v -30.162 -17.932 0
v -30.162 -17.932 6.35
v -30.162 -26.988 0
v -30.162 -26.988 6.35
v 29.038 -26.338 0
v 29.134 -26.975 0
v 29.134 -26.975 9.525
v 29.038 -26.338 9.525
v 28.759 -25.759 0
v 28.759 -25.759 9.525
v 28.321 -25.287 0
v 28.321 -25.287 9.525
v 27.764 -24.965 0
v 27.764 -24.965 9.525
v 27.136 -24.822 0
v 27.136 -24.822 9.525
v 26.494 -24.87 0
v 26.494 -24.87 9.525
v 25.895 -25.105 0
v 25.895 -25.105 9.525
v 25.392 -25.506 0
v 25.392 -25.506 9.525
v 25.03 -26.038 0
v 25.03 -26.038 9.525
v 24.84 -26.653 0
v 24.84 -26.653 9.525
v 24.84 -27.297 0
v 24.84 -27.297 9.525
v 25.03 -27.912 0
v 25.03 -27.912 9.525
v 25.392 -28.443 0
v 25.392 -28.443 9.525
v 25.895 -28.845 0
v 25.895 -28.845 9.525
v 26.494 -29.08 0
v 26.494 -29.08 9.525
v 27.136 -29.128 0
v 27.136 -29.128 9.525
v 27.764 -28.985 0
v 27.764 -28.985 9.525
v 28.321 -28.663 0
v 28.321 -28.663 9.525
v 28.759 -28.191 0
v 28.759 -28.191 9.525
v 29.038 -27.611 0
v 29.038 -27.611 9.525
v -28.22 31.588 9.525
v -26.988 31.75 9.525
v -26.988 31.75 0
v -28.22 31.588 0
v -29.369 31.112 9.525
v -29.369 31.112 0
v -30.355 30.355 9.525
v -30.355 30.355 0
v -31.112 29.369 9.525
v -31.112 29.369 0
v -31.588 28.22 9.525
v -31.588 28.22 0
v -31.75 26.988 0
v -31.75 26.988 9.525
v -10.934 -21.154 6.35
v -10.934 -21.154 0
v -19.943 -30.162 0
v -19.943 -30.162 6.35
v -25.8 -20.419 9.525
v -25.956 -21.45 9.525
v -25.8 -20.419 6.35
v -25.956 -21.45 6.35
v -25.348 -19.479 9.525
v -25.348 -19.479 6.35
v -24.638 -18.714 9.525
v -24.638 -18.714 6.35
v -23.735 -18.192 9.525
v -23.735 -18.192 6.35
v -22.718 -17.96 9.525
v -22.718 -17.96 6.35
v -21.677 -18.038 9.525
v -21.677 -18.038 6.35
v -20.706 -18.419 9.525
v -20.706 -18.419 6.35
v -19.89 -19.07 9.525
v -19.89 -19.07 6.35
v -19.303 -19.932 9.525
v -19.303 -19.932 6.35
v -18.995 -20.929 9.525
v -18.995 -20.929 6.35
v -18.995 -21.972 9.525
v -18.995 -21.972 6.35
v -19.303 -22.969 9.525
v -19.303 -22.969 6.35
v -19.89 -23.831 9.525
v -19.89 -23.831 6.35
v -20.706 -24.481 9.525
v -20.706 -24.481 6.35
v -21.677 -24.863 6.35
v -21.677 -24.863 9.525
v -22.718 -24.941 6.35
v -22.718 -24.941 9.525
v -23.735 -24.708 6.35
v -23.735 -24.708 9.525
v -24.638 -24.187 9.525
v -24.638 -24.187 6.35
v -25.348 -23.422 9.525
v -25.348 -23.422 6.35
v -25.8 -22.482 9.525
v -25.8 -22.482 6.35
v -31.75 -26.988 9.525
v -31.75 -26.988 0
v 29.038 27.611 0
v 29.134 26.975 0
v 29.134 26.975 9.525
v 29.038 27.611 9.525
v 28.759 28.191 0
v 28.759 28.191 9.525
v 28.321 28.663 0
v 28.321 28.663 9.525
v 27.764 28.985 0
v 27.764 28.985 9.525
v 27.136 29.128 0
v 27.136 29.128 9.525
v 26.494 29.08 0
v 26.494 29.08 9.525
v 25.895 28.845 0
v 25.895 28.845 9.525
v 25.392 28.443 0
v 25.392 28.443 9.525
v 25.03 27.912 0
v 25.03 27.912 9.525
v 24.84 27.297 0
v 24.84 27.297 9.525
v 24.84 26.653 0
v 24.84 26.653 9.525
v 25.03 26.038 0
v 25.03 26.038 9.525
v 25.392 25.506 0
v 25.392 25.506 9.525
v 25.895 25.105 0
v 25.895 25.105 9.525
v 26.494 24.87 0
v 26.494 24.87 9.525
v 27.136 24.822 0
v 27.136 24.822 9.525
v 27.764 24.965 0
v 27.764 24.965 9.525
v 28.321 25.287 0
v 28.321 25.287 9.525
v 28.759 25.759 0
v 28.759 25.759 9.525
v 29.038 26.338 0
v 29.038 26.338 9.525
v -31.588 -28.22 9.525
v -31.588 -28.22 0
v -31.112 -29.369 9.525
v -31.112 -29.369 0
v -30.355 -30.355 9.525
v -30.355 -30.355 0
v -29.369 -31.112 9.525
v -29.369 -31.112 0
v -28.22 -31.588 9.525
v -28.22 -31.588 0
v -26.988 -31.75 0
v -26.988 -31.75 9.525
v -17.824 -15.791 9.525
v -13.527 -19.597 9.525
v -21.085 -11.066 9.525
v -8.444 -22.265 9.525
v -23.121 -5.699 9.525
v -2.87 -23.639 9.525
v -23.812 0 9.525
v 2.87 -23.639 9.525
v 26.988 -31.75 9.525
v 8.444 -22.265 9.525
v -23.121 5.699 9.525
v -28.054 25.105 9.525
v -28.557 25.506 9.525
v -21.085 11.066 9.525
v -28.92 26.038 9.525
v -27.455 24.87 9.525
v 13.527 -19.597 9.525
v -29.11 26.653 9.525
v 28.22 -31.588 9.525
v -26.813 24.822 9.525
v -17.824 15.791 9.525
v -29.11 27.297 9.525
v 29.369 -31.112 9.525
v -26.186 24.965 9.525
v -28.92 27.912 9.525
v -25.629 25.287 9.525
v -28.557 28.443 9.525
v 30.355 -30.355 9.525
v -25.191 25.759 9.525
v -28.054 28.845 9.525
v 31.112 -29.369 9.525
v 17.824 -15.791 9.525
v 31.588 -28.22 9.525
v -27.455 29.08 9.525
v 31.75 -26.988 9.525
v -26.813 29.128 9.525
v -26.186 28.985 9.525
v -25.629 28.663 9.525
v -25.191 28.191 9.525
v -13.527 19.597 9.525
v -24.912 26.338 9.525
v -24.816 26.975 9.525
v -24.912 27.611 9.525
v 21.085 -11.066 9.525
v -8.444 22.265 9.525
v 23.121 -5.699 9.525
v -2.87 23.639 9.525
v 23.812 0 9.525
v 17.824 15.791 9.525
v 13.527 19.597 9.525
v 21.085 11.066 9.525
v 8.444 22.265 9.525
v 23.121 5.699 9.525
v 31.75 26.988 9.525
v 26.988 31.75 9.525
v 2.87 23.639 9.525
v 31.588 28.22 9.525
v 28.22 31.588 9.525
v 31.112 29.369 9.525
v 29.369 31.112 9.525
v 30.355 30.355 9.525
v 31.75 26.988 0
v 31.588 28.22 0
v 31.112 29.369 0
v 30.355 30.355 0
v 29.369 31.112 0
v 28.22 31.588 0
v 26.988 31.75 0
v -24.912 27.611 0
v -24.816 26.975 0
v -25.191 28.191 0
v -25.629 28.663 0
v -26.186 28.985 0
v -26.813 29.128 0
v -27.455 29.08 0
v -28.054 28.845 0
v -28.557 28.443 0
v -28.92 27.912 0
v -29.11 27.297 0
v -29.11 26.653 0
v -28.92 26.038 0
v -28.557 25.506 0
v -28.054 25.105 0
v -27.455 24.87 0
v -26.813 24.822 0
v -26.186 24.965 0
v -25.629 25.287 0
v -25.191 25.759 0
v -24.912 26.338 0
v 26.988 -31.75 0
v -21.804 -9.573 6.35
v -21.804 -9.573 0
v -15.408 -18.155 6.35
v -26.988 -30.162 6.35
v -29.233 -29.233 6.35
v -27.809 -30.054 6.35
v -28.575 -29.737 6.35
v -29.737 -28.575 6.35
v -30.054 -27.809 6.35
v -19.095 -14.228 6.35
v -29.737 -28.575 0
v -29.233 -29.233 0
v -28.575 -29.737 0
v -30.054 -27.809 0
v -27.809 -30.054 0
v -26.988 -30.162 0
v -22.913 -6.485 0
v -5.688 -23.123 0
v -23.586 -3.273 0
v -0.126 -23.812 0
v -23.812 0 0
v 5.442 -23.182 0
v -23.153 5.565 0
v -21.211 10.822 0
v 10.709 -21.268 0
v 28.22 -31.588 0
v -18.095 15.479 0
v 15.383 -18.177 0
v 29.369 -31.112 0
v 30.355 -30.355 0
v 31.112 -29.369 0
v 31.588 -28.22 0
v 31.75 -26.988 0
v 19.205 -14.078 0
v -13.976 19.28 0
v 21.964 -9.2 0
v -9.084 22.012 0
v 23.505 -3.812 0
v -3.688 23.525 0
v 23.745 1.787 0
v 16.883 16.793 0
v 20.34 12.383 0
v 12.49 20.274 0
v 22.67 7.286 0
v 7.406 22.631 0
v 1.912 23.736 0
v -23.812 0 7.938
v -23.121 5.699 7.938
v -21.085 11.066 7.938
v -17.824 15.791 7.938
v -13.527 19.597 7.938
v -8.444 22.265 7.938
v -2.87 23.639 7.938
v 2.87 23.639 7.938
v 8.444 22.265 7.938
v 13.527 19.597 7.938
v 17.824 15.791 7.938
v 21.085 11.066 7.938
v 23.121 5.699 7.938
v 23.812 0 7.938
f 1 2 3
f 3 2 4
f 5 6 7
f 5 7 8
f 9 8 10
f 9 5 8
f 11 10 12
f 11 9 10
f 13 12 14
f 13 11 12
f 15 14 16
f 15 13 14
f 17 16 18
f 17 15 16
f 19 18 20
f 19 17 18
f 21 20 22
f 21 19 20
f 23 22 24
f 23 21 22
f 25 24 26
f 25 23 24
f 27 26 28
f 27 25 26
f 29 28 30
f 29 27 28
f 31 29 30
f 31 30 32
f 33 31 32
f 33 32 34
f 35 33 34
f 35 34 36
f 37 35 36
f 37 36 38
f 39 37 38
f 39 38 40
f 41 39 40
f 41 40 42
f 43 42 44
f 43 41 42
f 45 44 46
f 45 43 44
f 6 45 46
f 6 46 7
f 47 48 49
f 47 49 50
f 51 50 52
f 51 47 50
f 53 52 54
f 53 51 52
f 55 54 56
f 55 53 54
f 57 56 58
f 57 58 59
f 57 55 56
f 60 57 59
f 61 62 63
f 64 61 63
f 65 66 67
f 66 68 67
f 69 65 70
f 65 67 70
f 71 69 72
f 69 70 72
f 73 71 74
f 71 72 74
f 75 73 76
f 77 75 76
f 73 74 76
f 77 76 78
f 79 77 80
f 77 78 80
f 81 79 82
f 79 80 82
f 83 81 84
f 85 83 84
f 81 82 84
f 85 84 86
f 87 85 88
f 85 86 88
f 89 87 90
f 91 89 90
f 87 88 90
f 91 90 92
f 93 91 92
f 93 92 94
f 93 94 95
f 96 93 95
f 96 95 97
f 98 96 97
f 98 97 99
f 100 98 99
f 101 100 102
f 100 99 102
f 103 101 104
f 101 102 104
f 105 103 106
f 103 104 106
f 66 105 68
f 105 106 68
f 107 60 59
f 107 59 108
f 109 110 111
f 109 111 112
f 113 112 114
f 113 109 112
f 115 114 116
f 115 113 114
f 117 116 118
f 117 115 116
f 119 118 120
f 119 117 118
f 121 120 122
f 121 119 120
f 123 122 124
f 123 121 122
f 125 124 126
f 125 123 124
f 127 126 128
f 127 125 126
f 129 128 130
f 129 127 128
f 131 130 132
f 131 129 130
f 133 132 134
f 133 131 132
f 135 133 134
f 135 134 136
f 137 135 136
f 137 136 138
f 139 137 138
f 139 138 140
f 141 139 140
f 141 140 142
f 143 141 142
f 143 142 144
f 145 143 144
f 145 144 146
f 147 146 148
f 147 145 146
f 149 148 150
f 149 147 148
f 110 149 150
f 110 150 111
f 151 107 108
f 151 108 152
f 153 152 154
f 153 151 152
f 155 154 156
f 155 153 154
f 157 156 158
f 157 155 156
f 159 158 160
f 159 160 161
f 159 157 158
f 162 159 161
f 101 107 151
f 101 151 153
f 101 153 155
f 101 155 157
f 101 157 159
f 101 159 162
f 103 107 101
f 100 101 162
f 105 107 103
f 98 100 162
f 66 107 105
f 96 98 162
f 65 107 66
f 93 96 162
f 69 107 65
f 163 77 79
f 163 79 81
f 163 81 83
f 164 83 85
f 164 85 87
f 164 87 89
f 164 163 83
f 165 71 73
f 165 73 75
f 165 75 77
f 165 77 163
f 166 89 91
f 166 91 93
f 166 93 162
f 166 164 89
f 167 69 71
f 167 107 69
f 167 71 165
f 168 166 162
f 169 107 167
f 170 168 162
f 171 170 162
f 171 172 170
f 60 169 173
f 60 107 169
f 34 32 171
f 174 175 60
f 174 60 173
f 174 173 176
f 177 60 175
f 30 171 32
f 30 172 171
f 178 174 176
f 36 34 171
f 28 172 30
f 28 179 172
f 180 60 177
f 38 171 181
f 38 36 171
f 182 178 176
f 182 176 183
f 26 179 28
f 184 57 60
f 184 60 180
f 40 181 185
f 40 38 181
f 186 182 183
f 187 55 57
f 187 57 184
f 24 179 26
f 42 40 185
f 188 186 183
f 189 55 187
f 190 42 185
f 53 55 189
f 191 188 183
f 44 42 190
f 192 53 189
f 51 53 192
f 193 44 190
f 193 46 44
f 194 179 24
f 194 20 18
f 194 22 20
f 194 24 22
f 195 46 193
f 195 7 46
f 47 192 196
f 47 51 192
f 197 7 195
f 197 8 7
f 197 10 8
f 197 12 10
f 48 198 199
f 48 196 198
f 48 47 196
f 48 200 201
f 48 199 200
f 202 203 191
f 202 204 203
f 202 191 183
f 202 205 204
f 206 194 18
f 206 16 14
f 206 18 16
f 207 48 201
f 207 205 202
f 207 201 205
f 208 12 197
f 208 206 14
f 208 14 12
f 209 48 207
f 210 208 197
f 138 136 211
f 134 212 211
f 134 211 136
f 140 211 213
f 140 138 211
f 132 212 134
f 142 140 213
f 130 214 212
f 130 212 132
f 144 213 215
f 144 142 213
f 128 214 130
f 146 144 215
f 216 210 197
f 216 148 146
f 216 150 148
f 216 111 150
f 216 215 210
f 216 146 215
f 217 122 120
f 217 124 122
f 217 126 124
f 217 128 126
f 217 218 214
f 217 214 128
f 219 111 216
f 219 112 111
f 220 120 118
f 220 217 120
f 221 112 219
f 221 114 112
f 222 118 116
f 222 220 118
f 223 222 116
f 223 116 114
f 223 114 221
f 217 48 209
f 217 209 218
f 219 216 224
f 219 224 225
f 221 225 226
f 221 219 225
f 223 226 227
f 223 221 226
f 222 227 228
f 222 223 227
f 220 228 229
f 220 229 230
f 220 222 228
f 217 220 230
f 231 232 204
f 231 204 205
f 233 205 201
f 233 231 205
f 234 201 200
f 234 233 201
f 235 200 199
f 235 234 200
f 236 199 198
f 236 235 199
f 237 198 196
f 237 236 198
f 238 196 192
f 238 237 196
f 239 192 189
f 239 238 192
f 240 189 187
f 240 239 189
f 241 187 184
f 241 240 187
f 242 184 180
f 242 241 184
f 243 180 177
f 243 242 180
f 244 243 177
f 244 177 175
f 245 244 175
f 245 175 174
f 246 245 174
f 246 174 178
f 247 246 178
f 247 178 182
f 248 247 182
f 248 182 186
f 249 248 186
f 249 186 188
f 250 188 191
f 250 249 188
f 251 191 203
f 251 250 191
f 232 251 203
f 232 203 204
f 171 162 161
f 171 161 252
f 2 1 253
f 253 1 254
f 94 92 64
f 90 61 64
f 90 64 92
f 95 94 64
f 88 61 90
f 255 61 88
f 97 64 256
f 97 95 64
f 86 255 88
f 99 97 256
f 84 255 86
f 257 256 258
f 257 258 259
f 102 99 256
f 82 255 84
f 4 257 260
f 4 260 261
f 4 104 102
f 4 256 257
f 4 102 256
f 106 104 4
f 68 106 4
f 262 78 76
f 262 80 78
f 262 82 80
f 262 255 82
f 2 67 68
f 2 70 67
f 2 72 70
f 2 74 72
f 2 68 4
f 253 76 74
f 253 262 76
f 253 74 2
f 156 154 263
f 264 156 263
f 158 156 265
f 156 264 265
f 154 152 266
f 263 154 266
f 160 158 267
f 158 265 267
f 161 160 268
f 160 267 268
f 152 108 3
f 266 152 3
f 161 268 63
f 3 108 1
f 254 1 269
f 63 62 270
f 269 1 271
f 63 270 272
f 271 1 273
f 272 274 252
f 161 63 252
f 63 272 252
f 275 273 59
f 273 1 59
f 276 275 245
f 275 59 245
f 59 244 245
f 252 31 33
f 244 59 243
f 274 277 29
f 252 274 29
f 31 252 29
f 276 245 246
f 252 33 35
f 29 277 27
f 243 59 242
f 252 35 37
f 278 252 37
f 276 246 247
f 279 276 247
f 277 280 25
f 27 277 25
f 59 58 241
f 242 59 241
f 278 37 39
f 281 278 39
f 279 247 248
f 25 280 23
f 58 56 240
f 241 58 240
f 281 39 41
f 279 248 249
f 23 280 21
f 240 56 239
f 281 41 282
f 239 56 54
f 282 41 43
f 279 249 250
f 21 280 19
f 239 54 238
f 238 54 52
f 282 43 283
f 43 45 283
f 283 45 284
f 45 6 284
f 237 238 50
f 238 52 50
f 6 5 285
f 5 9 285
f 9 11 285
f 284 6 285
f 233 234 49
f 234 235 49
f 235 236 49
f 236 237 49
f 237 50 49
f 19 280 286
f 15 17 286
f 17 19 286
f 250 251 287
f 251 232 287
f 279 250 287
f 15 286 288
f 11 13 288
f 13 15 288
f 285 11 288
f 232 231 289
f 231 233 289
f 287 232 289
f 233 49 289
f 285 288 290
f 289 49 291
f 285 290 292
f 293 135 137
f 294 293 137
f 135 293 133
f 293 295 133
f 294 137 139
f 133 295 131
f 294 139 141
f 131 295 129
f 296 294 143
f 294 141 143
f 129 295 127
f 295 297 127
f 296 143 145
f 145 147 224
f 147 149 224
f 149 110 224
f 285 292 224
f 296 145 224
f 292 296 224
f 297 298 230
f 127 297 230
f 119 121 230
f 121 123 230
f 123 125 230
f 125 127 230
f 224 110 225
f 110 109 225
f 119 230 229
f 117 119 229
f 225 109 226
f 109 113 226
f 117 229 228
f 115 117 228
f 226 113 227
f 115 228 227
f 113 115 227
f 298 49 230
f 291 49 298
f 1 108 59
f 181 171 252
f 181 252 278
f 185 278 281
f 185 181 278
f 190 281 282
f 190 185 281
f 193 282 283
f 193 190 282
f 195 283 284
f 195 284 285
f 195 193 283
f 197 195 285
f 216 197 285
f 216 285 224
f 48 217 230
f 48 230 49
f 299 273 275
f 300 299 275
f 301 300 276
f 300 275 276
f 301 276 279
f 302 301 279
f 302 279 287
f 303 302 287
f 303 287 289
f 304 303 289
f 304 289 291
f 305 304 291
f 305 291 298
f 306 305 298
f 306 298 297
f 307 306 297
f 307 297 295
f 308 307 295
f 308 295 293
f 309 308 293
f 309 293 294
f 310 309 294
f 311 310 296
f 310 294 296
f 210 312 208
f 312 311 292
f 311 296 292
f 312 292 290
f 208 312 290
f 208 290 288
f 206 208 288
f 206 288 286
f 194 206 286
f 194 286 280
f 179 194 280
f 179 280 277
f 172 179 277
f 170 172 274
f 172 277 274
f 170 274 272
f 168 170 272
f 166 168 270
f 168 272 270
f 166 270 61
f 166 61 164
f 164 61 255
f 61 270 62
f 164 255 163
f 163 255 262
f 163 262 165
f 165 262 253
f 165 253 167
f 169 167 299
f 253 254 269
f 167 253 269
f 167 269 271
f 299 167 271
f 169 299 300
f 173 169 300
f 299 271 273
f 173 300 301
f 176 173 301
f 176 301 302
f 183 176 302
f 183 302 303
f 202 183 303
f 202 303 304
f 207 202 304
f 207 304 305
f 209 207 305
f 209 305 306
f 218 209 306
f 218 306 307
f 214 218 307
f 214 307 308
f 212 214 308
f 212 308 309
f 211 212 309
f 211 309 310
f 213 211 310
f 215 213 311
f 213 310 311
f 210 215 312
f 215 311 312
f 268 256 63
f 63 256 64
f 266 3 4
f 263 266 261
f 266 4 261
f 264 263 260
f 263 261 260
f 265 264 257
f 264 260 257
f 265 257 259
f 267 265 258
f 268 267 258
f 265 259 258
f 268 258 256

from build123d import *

# Parameters (mm, degrees)
SKETCH1_R                = 2.159
SKETCH1_R_2              = 28.5115
BOSS_EXTRUDE1_DEPTH      = 9.525
SKETCH1_4_R              = 28.5115
SKETCH1_4_R_2            = 23.8125
FLUSH_BEZEL_DEPTH        = 9.525
SKETCH1_5_R              = 28.5115
SKETCH1_5_R_2            = 23.8125
BOSS_EXTRUDE4_DEPTH      = 6.35
SKETCH2_R                = 25.3365
CUT_EXTRUDE1_DEPTH       = 7.35
CUT_EXTRUDE1_DEPTH_BACK  = 9.525
SKETCH3_R                = 28.5115
CUT_EXTRUDE2_DEPTH       = 7.35
SKETCH4_R                = 25.3365
SKETCH4_R_2              = 23.8125
BOSS_EXTRUDE7_DEPTH      = 1.5875
M6_CLEARANCE_HOLE1_D     = 7
M6_CLEARANCE_HOLE1_DEPTH = 9.525
BOSS_EXTRUDE8_REACH      = 11.525
SKETCH8_R                = 25.3365
SKETCH8_R_2              = 23.8125
CUT_EXTRUDE3_DEPTH       = 6.35
BOSS_EXTRUDE9_DEPTH      = 9.525


with BuildPart() as part:
    # Sketch1 → Boss-Extrude1 (new body)
    with BuildSketch(Plane.XY):
        with BuildLine():
            Line((-26.9875, 30.1625), (26.9875, 30.1625))
            ThreePointArc((26.9875, 30.1625), (29.23256403, 29.23256403), (30.1625, 26.9875))
            Line((30.1625, 26.9875), (30.1625, -26.9875))
            ThreePointArc((30.1625, -26.9875), (29.23256403, -29.23256403), (26.9875, -30.1625))
            Line((26.9875, -30.1625), (-26.9875, -30.1625))
            ThreePointArc((-26.9875, -30.1625), (-29.23256403, -29.23256403), (-30.1625, -26.9875))
            Line((-30.1625, -26.9875), (-30.1625, 26.9875))
            ThreePointArc((-30.1625, 26.9875), (-29.23256403, 29.23256403), (-26.9875, 30.1625))
        make_face()
        with Locations((-26.9748, 26.9748)):
            Circle(SKETCH1_R, mode=Mode.SUBTRACT)
        with Locations((26.9748, 26.9748)):
            Circle(SKETCH1_R, mode=Mode.SUBTRACT)
        with Locations((26.9748, -26.9748)):
            Circle(SKETCH1_R, mode=Mode.SUBTRACT)
        Circle(SKETCH1_R_2, mode=Mode.SUBTRACT)
    extrude(amount=BOSS_EXTRUDE1_DEPTH)

    # Sketch1_4 → Flush Bezel (add)
    with BuildSketch(Plane.XY):
        Circle(SKETCH1_4_R)
        Circle(SKETCH1_4_R_2, mode=Mode.SUBTRACT)
    extrude(amount=FLUSH_BEZEL_DEPTH)

    # Sketch1_5 → Boss-Extrude4 (add)
    with BuildSketch(Plane.XY):
        Circle(SKETCH1_5_R)
        Circle(SKETCH1_5_R_2, mode=Mode.SUBTRACT)
    extrude(amount=-BOSS_EXTRUDE4_DEPTH)

    # Sketch2 → Cut-Extrude1 (cut, two sides)
    with BuildSketch(Plane(origin=(0, 0, 0), x_dir=(-1, 0, 0), z_dir=(0, 0, -1))) as cut_extrude1_sk:
        Circle(SKETCH2_R)
    extrude(amount=CUT_EXTRUDE1_DEPTH, mode=Mode.SUBTRACT)
    extrude(cut_extrude1_sk.sketch, amount=-CUT_EXTRUDE1_DEPTH_BACK, mode=Mode.SUBTRACT)

    # Sketch3 → Cut-Extrude2 (cut, through all)
    with BuildSketch(Plane(origin=(0, 0, 0), x_dir=(-1, 0, 0), z_dir=(0, 0, -1))):
        Circle(SKETCH3_R)
    extrude(amount=CUT_EXTRUDE2_DEPTH, mode=Mode.SUBTRACT)

    # Sketch4 → Boss-Extrude7 (add)
    with BuildSketch(Plane.XY.offset(9.525)):
        Circle(SKETCH4_R)
        Circle(SKETCH4_R_2, mode=Mode.SUBTRACT)
    extrude(amount=-BOSS_EXTRUDE7_DEPTH)

    # M6 Clearance Hole1
    with Locations(Plane.XY.offset(9.525)):
        with Locations((-22.45595798, -21.4503)):
            Hole(M6_CLEARANCE_HOLE1_D / 2, depth=M6_CLEARANCE_HOLE1_DEPTH)

    # Sketch8 → Boss-Extrude8 (add, up to next)
    with BuildSketch(Plane(origin=(0, 0, 0), x_dir=(-1, 0, 0), z_dir=(0, 0, -1)), mode=Mode.PRIVATE) as boss_extrude8_sk1:
        Circle(SKETCH8_R)
        Circle(SKETCH8_R_2, mode=Mode.SUBTRACT)
    boss_extrude8_tool1 = extrude(boss_extrude8_sk1.sketch, amount=-BOSS_EXTRUDE8_REACH, mode=Mode.PRIVATE) - part.part
    add(boss_extrude8_tool1.solids().sort_by_distance((24.619876, 0, 0))[0])

    # Sketch9 → Cut-Extrude3 (cut)
    with BuildSketch(Plane(origin=(0, 0, 0), x_dir=(-1, 0, 0), z_dir=(0, 0, -1))):
        Polygon((25.823554026, -36.043216197), (37.048874177, -24.817896045), (19.088361935, -6.857383803), (7.863041784, -18.082703955), align=None)
    extrude(amount=-CUT_EXTRUDE3_DEPTH, mode=Mode.SUBTRACT)

    # Sketch10 → Boss-Extrude9 (add)
    with BuildSketch(Plane.XY.offset(9.525)):
        with BuildLine():
            Line((26.9875, 31.75), (-26.9875, 31.75))
            ThreePointArc((-26.9875, 31.75), (-30.355096045, 30.355096045), (-31.75, 26.9875))
            Line((-31.75, 26.9875), (-31.75, -26.9875))
            ThreePointArc((-31.75, -26.9875), (-30.355096045, -30.355096045), (-26.9875, -31.75))
            Line((-26.9875, -31.75), (26.9875, -31.75))
            ThreePointArc((26.9875, -31.75), (30.355096045, -30.355096045), (31.75, -26.9875))
            Line((31.75, -26.9875), (31.75, 26.9875))
            ThreePointArc((31.75, 26.9875), (30.355096045, 30.355096045), (26.9875, 31.75))
        make_face()
        with BuildLine():
            Line((26.9875, 30.1625), (-26.9875, 30.1625))
            ThreePointArc((-26.9875, 30.1625), (-29.23256403, 29.23256403), (-30.1625, 26.9875))
            Line((-30.1625, 26.9875), (-30.1625, -26.9875))
            ThreePointArc((-30.1625, -26.9875), (-29.23256403, -29.23256403), (-26.9875, -30.1625))
            Line((-26.9875, -30.1625), (26.9875, -30.1625))
            ThreePointArc((26.9875, -30.1625), (29.23256403, -29.23256403), (30.1625, -26.9875))
            Line((30.1625, -26.9875), (30.1625, 26.9875))
            ThreePointArc((30.1625, 26.9875), (29.23256403, 29.23256403), (26.9875, 30.1625))
        make_face(mode=Mode.SUBTRACT)
    extrude(amount=-BOSS_EXTRUDE9_DEPTH)


solid = part.part
